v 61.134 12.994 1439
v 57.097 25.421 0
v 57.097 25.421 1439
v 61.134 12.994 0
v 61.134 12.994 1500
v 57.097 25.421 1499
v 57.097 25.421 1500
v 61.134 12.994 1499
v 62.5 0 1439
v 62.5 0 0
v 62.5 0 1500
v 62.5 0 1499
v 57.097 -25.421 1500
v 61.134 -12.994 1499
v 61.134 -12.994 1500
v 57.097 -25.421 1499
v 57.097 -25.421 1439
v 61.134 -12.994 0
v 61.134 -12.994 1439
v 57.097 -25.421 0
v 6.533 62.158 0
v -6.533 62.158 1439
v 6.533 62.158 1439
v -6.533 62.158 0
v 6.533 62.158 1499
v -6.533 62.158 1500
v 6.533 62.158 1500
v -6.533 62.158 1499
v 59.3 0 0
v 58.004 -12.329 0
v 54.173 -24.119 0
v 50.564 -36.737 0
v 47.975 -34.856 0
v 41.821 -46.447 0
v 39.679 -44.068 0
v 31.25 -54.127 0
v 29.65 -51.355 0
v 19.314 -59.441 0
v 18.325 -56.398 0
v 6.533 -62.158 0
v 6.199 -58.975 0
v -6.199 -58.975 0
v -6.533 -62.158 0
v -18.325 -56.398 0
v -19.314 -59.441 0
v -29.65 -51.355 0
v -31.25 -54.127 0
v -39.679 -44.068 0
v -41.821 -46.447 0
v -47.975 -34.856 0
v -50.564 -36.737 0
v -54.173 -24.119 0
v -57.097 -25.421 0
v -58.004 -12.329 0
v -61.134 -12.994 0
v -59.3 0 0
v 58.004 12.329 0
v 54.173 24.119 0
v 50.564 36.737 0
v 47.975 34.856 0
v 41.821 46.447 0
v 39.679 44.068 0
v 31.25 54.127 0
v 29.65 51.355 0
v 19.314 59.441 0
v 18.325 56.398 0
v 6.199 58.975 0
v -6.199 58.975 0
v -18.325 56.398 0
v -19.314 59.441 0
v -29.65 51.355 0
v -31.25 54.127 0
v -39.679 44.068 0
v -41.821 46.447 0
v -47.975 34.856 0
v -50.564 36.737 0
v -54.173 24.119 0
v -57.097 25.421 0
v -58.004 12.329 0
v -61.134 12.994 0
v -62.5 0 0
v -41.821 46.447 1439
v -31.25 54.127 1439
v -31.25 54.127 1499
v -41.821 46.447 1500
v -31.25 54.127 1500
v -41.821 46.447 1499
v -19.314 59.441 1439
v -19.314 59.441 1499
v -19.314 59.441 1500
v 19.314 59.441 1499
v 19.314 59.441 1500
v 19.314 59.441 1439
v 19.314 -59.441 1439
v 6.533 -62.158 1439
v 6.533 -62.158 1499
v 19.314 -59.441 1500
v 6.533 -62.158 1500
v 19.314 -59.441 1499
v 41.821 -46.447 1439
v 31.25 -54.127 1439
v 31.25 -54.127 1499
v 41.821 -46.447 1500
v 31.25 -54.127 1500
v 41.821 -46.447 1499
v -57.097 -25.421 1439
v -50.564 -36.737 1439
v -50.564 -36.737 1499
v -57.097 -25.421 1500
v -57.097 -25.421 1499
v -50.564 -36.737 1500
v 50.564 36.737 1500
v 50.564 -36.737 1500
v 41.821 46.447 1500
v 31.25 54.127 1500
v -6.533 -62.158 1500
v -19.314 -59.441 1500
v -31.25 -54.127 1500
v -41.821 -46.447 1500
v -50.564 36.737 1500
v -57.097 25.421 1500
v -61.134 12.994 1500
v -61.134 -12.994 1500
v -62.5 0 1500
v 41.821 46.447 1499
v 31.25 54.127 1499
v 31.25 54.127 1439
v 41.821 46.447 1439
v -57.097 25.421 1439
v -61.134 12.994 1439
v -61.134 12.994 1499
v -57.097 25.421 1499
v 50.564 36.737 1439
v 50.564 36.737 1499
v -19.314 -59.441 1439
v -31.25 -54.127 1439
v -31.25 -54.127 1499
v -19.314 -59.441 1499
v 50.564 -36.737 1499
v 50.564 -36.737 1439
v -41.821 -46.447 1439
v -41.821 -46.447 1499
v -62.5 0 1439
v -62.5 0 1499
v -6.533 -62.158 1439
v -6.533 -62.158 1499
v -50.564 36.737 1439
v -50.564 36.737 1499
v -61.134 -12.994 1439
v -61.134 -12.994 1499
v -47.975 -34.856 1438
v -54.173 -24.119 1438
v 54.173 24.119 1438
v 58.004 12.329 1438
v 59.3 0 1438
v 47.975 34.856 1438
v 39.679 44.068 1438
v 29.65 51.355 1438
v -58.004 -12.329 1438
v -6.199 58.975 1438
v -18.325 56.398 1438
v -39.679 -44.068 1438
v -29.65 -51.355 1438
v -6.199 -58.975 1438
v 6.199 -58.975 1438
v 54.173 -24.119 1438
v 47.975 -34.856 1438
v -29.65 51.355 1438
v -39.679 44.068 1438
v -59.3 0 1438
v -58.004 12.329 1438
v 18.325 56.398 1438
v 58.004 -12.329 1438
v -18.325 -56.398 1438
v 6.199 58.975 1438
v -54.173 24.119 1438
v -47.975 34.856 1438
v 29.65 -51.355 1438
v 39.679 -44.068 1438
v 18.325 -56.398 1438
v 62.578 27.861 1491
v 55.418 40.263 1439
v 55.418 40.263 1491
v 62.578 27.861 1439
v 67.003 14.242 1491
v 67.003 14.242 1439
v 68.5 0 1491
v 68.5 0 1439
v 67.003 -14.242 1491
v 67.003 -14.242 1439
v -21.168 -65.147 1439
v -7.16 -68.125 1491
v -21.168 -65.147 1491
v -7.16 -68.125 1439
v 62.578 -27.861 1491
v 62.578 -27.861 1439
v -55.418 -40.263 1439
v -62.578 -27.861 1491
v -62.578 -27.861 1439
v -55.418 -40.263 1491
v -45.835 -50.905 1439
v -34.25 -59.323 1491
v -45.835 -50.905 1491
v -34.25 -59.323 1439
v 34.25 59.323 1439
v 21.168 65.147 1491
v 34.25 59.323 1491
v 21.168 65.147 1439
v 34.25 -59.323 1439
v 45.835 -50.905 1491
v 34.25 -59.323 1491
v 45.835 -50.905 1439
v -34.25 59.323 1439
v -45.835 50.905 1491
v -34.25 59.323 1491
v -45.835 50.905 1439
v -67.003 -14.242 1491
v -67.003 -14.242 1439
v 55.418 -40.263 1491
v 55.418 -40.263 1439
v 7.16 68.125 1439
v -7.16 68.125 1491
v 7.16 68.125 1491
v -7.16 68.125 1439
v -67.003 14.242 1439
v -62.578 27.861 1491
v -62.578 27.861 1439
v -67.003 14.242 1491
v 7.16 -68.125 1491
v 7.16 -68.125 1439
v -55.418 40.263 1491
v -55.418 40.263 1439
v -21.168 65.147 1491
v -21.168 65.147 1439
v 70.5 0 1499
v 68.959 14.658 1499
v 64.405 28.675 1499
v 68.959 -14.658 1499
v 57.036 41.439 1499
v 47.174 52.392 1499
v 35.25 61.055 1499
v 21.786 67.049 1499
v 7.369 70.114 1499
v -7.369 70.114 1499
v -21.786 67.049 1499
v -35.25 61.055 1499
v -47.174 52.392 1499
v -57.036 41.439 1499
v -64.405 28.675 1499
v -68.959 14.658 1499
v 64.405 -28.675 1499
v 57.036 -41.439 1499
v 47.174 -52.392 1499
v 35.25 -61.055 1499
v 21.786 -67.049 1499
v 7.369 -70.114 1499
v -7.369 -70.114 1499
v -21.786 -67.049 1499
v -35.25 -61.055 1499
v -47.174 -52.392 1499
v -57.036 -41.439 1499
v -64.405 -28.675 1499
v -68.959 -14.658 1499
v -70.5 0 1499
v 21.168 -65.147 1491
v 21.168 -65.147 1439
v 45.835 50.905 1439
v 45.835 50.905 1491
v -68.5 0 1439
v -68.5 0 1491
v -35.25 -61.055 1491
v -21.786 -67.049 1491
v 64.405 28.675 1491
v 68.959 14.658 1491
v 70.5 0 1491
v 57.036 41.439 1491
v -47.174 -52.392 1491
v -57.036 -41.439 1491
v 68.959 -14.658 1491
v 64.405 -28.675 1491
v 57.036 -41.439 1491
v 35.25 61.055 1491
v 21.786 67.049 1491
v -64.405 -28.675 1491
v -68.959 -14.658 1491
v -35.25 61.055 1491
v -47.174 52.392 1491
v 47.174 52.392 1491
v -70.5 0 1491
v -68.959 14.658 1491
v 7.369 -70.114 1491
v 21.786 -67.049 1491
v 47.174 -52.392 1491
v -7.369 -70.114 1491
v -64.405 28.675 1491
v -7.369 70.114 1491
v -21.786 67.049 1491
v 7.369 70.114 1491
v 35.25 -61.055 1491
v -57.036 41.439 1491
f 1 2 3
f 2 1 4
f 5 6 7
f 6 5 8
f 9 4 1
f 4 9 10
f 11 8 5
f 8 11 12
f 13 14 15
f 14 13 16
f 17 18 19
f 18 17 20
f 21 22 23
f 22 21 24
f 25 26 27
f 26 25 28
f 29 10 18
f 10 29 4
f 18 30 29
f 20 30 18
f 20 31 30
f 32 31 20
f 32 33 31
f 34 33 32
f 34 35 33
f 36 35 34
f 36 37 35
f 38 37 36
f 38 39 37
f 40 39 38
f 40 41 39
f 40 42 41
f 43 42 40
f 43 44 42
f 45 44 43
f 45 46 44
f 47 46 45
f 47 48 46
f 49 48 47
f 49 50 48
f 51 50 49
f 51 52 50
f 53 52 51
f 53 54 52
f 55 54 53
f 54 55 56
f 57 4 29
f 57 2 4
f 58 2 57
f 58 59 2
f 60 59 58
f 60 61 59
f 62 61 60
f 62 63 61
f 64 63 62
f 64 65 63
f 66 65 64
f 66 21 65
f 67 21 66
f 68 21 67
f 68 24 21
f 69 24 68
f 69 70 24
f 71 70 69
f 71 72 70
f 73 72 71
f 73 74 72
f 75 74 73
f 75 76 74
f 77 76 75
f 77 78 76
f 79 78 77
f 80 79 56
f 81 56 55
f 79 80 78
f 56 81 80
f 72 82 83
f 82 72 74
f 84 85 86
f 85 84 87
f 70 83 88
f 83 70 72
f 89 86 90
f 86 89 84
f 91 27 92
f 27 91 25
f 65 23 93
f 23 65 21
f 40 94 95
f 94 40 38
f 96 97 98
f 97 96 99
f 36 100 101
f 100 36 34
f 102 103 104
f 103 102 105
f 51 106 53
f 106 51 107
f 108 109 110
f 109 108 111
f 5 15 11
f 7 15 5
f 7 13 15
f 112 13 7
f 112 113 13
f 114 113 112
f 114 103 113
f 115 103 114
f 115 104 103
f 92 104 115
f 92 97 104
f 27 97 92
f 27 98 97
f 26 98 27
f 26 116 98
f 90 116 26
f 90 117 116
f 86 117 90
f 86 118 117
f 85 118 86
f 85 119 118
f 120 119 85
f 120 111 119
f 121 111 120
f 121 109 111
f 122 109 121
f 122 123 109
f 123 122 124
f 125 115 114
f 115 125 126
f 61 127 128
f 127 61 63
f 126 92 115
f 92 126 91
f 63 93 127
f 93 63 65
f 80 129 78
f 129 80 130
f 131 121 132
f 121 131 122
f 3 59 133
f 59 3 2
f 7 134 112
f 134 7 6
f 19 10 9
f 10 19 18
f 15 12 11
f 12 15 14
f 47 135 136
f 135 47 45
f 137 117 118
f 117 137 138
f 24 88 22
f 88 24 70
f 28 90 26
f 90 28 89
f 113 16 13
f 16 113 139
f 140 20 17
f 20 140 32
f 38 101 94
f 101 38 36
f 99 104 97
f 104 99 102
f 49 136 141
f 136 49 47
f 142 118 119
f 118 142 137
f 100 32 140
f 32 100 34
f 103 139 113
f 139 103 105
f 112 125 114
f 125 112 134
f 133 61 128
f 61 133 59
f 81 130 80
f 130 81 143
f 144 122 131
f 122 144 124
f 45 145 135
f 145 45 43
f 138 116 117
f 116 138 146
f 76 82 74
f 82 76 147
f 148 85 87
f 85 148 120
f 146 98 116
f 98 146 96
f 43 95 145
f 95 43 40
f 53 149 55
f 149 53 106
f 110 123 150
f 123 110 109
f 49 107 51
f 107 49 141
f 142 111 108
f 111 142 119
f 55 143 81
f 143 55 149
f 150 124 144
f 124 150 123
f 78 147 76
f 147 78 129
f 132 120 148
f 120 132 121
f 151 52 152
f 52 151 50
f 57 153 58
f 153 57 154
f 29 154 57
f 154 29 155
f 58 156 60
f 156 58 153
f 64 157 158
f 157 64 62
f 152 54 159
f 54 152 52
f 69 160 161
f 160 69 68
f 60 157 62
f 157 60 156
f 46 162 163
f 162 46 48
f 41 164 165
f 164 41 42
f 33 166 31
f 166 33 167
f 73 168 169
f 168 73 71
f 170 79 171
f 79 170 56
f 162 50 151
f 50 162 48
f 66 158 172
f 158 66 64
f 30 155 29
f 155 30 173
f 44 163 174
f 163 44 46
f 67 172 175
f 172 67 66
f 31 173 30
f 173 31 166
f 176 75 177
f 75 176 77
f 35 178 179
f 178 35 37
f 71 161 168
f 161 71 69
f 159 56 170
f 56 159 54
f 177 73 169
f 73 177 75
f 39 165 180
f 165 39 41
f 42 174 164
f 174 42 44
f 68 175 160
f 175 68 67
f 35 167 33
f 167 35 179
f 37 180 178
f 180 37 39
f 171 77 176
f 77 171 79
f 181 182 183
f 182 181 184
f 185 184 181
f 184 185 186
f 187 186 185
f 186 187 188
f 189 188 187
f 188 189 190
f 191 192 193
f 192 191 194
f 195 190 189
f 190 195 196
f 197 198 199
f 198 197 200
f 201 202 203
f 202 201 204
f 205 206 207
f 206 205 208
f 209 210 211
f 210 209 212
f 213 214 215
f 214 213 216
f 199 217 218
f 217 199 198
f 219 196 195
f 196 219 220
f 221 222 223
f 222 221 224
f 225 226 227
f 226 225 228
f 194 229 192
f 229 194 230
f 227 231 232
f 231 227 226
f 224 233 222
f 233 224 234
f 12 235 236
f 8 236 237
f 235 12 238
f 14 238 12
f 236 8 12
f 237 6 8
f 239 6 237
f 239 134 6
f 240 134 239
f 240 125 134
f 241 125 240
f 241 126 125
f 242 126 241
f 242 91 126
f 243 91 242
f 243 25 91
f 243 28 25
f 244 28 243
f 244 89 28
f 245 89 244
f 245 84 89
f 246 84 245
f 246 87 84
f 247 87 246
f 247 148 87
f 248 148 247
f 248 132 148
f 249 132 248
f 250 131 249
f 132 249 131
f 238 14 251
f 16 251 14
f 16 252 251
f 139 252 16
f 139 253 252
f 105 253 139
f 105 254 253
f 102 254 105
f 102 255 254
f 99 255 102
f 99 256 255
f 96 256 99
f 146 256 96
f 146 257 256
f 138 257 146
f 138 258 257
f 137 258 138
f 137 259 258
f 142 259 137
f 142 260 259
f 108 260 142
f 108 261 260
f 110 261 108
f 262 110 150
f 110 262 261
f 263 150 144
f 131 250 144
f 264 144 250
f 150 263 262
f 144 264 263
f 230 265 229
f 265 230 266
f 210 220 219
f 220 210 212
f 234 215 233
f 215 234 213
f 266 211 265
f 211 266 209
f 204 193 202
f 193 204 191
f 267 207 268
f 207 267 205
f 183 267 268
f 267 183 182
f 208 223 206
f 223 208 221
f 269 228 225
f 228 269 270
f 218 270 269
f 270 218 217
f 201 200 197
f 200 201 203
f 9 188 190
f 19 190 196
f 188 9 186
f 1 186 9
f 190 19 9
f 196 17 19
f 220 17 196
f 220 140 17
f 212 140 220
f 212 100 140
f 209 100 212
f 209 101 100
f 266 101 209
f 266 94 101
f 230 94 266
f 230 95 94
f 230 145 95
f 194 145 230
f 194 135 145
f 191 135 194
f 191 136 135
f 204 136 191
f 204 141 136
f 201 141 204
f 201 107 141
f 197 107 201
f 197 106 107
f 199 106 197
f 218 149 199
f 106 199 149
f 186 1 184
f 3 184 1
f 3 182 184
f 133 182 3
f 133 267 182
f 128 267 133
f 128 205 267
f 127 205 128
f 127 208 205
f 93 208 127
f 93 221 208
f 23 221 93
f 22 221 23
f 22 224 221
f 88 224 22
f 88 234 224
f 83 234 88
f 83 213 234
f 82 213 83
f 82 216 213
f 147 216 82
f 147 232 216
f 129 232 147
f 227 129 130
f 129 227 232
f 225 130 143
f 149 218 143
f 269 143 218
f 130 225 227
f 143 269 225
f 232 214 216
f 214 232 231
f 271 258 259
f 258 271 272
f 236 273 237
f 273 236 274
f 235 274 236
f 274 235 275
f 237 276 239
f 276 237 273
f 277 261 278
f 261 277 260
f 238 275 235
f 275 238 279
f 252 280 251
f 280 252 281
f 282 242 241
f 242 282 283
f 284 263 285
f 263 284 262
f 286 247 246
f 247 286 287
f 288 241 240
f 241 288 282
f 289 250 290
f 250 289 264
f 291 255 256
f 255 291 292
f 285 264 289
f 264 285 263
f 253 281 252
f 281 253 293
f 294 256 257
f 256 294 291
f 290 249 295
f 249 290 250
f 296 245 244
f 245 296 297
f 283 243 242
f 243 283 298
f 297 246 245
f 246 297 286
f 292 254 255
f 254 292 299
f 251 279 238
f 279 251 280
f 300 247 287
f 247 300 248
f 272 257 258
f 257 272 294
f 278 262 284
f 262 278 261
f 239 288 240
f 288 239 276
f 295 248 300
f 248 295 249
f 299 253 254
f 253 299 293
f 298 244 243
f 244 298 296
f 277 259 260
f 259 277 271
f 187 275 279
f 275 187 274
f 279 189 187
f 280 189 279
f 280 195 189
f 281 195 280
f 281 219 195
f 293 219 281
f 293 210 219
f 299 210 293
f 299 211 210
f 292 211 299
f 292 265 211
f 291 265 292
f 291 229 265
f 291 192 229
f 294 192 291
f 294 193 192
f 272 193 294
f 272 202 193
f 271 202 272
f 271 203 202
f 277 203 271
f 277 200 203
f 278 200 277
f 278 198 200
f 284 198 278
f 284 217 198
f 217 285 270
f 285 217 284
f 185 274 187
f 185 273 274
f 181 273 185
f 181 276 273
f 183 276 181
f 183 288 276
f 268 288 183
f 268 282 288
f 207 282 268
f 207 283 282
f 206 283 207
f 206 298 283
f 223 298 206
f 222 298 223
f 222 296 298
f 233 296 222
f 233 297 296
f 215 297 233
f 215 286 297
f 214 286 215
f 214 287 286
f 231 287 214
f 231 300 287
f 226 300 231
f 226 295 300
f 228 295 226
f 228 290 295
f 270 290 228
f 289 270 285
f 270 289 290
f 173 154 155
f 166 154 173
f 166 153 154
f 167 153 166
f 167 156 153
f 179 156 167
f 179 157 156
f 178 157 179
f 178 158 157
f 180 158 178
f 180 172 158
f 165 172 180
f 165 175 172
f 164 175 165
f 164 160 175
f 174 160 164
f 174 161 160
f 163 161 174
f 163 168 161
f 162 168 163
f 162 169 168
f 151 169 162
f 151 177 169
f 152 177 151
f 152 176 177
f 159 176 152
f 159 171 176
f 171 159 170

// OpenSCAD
// Parameters
nominal_od_mm = 125; //[60:250:1]
wall_thickness_mm = 3.2; //[1.6:6.4:0.1]
length_mm = 1500; //[750:3000:10]
include_end_fitting = 1; //[0:1:1]
fitting_length_mm = 60; //[30:120:1]
fitting_radial_add_mm = 6; //[2:15:0.5]
fitting_stop_ring_len_mm = 8; //[3:20:0.5]
fitting_stop_ring_rad_add_mm = 2; //[0.5:6:0.5]
overlap_mm = 1; //[0.5:2:0.1]

// HT Pipe Segment - Complete Geometry
module ht_pipe() {
  color([0.85, 0.85, 0.8]) { // PVC color
    // Main pipe segment
    difference() {
      cylinder(h=length_mm, r=nominal_od_mm/2, center=false);
      translate([0, 0, -overlap_mm])
        cylinder(h=length_mm + overlap_mm*2, r=nominal_od_mm/2 - wall_thickness_mm, center=false);
    }
    
    // End fitting detail
    if (include_end_fitting) {
      union() {
        // Outer fitting
        translate([0, 0, length_mm - fitting_length_mm - overlap_mm])
          cylinder(h=fitting_length_mm, r=nominal_od_mm/2 + fitting_radial_add_mm, center=false);
        
        // Stop ring
        translate([0, 0, length_mm - fitting_stop_ring_len_mm - overlap_mm])
          cylinder(h=fitting_stop_ring_len_mm, r=nominal_od_mm/2 + fitting_radial_add_mm + fitting_stop_ring_rad_add_mm, center=false);
      }
      
      // Bore cutter for fitting
      translate([0, 0, length_mm - fitting_length_mm - overlap_mm*2])
        cylinder(h=fitting_length_mm + overlap_mm*2, r=nominal_od_mm/2 - wall_thickness_mm, center=false);
    }
  }
}

// Assembly
module assembly() {
  ht_pipe();
}

assembly();
